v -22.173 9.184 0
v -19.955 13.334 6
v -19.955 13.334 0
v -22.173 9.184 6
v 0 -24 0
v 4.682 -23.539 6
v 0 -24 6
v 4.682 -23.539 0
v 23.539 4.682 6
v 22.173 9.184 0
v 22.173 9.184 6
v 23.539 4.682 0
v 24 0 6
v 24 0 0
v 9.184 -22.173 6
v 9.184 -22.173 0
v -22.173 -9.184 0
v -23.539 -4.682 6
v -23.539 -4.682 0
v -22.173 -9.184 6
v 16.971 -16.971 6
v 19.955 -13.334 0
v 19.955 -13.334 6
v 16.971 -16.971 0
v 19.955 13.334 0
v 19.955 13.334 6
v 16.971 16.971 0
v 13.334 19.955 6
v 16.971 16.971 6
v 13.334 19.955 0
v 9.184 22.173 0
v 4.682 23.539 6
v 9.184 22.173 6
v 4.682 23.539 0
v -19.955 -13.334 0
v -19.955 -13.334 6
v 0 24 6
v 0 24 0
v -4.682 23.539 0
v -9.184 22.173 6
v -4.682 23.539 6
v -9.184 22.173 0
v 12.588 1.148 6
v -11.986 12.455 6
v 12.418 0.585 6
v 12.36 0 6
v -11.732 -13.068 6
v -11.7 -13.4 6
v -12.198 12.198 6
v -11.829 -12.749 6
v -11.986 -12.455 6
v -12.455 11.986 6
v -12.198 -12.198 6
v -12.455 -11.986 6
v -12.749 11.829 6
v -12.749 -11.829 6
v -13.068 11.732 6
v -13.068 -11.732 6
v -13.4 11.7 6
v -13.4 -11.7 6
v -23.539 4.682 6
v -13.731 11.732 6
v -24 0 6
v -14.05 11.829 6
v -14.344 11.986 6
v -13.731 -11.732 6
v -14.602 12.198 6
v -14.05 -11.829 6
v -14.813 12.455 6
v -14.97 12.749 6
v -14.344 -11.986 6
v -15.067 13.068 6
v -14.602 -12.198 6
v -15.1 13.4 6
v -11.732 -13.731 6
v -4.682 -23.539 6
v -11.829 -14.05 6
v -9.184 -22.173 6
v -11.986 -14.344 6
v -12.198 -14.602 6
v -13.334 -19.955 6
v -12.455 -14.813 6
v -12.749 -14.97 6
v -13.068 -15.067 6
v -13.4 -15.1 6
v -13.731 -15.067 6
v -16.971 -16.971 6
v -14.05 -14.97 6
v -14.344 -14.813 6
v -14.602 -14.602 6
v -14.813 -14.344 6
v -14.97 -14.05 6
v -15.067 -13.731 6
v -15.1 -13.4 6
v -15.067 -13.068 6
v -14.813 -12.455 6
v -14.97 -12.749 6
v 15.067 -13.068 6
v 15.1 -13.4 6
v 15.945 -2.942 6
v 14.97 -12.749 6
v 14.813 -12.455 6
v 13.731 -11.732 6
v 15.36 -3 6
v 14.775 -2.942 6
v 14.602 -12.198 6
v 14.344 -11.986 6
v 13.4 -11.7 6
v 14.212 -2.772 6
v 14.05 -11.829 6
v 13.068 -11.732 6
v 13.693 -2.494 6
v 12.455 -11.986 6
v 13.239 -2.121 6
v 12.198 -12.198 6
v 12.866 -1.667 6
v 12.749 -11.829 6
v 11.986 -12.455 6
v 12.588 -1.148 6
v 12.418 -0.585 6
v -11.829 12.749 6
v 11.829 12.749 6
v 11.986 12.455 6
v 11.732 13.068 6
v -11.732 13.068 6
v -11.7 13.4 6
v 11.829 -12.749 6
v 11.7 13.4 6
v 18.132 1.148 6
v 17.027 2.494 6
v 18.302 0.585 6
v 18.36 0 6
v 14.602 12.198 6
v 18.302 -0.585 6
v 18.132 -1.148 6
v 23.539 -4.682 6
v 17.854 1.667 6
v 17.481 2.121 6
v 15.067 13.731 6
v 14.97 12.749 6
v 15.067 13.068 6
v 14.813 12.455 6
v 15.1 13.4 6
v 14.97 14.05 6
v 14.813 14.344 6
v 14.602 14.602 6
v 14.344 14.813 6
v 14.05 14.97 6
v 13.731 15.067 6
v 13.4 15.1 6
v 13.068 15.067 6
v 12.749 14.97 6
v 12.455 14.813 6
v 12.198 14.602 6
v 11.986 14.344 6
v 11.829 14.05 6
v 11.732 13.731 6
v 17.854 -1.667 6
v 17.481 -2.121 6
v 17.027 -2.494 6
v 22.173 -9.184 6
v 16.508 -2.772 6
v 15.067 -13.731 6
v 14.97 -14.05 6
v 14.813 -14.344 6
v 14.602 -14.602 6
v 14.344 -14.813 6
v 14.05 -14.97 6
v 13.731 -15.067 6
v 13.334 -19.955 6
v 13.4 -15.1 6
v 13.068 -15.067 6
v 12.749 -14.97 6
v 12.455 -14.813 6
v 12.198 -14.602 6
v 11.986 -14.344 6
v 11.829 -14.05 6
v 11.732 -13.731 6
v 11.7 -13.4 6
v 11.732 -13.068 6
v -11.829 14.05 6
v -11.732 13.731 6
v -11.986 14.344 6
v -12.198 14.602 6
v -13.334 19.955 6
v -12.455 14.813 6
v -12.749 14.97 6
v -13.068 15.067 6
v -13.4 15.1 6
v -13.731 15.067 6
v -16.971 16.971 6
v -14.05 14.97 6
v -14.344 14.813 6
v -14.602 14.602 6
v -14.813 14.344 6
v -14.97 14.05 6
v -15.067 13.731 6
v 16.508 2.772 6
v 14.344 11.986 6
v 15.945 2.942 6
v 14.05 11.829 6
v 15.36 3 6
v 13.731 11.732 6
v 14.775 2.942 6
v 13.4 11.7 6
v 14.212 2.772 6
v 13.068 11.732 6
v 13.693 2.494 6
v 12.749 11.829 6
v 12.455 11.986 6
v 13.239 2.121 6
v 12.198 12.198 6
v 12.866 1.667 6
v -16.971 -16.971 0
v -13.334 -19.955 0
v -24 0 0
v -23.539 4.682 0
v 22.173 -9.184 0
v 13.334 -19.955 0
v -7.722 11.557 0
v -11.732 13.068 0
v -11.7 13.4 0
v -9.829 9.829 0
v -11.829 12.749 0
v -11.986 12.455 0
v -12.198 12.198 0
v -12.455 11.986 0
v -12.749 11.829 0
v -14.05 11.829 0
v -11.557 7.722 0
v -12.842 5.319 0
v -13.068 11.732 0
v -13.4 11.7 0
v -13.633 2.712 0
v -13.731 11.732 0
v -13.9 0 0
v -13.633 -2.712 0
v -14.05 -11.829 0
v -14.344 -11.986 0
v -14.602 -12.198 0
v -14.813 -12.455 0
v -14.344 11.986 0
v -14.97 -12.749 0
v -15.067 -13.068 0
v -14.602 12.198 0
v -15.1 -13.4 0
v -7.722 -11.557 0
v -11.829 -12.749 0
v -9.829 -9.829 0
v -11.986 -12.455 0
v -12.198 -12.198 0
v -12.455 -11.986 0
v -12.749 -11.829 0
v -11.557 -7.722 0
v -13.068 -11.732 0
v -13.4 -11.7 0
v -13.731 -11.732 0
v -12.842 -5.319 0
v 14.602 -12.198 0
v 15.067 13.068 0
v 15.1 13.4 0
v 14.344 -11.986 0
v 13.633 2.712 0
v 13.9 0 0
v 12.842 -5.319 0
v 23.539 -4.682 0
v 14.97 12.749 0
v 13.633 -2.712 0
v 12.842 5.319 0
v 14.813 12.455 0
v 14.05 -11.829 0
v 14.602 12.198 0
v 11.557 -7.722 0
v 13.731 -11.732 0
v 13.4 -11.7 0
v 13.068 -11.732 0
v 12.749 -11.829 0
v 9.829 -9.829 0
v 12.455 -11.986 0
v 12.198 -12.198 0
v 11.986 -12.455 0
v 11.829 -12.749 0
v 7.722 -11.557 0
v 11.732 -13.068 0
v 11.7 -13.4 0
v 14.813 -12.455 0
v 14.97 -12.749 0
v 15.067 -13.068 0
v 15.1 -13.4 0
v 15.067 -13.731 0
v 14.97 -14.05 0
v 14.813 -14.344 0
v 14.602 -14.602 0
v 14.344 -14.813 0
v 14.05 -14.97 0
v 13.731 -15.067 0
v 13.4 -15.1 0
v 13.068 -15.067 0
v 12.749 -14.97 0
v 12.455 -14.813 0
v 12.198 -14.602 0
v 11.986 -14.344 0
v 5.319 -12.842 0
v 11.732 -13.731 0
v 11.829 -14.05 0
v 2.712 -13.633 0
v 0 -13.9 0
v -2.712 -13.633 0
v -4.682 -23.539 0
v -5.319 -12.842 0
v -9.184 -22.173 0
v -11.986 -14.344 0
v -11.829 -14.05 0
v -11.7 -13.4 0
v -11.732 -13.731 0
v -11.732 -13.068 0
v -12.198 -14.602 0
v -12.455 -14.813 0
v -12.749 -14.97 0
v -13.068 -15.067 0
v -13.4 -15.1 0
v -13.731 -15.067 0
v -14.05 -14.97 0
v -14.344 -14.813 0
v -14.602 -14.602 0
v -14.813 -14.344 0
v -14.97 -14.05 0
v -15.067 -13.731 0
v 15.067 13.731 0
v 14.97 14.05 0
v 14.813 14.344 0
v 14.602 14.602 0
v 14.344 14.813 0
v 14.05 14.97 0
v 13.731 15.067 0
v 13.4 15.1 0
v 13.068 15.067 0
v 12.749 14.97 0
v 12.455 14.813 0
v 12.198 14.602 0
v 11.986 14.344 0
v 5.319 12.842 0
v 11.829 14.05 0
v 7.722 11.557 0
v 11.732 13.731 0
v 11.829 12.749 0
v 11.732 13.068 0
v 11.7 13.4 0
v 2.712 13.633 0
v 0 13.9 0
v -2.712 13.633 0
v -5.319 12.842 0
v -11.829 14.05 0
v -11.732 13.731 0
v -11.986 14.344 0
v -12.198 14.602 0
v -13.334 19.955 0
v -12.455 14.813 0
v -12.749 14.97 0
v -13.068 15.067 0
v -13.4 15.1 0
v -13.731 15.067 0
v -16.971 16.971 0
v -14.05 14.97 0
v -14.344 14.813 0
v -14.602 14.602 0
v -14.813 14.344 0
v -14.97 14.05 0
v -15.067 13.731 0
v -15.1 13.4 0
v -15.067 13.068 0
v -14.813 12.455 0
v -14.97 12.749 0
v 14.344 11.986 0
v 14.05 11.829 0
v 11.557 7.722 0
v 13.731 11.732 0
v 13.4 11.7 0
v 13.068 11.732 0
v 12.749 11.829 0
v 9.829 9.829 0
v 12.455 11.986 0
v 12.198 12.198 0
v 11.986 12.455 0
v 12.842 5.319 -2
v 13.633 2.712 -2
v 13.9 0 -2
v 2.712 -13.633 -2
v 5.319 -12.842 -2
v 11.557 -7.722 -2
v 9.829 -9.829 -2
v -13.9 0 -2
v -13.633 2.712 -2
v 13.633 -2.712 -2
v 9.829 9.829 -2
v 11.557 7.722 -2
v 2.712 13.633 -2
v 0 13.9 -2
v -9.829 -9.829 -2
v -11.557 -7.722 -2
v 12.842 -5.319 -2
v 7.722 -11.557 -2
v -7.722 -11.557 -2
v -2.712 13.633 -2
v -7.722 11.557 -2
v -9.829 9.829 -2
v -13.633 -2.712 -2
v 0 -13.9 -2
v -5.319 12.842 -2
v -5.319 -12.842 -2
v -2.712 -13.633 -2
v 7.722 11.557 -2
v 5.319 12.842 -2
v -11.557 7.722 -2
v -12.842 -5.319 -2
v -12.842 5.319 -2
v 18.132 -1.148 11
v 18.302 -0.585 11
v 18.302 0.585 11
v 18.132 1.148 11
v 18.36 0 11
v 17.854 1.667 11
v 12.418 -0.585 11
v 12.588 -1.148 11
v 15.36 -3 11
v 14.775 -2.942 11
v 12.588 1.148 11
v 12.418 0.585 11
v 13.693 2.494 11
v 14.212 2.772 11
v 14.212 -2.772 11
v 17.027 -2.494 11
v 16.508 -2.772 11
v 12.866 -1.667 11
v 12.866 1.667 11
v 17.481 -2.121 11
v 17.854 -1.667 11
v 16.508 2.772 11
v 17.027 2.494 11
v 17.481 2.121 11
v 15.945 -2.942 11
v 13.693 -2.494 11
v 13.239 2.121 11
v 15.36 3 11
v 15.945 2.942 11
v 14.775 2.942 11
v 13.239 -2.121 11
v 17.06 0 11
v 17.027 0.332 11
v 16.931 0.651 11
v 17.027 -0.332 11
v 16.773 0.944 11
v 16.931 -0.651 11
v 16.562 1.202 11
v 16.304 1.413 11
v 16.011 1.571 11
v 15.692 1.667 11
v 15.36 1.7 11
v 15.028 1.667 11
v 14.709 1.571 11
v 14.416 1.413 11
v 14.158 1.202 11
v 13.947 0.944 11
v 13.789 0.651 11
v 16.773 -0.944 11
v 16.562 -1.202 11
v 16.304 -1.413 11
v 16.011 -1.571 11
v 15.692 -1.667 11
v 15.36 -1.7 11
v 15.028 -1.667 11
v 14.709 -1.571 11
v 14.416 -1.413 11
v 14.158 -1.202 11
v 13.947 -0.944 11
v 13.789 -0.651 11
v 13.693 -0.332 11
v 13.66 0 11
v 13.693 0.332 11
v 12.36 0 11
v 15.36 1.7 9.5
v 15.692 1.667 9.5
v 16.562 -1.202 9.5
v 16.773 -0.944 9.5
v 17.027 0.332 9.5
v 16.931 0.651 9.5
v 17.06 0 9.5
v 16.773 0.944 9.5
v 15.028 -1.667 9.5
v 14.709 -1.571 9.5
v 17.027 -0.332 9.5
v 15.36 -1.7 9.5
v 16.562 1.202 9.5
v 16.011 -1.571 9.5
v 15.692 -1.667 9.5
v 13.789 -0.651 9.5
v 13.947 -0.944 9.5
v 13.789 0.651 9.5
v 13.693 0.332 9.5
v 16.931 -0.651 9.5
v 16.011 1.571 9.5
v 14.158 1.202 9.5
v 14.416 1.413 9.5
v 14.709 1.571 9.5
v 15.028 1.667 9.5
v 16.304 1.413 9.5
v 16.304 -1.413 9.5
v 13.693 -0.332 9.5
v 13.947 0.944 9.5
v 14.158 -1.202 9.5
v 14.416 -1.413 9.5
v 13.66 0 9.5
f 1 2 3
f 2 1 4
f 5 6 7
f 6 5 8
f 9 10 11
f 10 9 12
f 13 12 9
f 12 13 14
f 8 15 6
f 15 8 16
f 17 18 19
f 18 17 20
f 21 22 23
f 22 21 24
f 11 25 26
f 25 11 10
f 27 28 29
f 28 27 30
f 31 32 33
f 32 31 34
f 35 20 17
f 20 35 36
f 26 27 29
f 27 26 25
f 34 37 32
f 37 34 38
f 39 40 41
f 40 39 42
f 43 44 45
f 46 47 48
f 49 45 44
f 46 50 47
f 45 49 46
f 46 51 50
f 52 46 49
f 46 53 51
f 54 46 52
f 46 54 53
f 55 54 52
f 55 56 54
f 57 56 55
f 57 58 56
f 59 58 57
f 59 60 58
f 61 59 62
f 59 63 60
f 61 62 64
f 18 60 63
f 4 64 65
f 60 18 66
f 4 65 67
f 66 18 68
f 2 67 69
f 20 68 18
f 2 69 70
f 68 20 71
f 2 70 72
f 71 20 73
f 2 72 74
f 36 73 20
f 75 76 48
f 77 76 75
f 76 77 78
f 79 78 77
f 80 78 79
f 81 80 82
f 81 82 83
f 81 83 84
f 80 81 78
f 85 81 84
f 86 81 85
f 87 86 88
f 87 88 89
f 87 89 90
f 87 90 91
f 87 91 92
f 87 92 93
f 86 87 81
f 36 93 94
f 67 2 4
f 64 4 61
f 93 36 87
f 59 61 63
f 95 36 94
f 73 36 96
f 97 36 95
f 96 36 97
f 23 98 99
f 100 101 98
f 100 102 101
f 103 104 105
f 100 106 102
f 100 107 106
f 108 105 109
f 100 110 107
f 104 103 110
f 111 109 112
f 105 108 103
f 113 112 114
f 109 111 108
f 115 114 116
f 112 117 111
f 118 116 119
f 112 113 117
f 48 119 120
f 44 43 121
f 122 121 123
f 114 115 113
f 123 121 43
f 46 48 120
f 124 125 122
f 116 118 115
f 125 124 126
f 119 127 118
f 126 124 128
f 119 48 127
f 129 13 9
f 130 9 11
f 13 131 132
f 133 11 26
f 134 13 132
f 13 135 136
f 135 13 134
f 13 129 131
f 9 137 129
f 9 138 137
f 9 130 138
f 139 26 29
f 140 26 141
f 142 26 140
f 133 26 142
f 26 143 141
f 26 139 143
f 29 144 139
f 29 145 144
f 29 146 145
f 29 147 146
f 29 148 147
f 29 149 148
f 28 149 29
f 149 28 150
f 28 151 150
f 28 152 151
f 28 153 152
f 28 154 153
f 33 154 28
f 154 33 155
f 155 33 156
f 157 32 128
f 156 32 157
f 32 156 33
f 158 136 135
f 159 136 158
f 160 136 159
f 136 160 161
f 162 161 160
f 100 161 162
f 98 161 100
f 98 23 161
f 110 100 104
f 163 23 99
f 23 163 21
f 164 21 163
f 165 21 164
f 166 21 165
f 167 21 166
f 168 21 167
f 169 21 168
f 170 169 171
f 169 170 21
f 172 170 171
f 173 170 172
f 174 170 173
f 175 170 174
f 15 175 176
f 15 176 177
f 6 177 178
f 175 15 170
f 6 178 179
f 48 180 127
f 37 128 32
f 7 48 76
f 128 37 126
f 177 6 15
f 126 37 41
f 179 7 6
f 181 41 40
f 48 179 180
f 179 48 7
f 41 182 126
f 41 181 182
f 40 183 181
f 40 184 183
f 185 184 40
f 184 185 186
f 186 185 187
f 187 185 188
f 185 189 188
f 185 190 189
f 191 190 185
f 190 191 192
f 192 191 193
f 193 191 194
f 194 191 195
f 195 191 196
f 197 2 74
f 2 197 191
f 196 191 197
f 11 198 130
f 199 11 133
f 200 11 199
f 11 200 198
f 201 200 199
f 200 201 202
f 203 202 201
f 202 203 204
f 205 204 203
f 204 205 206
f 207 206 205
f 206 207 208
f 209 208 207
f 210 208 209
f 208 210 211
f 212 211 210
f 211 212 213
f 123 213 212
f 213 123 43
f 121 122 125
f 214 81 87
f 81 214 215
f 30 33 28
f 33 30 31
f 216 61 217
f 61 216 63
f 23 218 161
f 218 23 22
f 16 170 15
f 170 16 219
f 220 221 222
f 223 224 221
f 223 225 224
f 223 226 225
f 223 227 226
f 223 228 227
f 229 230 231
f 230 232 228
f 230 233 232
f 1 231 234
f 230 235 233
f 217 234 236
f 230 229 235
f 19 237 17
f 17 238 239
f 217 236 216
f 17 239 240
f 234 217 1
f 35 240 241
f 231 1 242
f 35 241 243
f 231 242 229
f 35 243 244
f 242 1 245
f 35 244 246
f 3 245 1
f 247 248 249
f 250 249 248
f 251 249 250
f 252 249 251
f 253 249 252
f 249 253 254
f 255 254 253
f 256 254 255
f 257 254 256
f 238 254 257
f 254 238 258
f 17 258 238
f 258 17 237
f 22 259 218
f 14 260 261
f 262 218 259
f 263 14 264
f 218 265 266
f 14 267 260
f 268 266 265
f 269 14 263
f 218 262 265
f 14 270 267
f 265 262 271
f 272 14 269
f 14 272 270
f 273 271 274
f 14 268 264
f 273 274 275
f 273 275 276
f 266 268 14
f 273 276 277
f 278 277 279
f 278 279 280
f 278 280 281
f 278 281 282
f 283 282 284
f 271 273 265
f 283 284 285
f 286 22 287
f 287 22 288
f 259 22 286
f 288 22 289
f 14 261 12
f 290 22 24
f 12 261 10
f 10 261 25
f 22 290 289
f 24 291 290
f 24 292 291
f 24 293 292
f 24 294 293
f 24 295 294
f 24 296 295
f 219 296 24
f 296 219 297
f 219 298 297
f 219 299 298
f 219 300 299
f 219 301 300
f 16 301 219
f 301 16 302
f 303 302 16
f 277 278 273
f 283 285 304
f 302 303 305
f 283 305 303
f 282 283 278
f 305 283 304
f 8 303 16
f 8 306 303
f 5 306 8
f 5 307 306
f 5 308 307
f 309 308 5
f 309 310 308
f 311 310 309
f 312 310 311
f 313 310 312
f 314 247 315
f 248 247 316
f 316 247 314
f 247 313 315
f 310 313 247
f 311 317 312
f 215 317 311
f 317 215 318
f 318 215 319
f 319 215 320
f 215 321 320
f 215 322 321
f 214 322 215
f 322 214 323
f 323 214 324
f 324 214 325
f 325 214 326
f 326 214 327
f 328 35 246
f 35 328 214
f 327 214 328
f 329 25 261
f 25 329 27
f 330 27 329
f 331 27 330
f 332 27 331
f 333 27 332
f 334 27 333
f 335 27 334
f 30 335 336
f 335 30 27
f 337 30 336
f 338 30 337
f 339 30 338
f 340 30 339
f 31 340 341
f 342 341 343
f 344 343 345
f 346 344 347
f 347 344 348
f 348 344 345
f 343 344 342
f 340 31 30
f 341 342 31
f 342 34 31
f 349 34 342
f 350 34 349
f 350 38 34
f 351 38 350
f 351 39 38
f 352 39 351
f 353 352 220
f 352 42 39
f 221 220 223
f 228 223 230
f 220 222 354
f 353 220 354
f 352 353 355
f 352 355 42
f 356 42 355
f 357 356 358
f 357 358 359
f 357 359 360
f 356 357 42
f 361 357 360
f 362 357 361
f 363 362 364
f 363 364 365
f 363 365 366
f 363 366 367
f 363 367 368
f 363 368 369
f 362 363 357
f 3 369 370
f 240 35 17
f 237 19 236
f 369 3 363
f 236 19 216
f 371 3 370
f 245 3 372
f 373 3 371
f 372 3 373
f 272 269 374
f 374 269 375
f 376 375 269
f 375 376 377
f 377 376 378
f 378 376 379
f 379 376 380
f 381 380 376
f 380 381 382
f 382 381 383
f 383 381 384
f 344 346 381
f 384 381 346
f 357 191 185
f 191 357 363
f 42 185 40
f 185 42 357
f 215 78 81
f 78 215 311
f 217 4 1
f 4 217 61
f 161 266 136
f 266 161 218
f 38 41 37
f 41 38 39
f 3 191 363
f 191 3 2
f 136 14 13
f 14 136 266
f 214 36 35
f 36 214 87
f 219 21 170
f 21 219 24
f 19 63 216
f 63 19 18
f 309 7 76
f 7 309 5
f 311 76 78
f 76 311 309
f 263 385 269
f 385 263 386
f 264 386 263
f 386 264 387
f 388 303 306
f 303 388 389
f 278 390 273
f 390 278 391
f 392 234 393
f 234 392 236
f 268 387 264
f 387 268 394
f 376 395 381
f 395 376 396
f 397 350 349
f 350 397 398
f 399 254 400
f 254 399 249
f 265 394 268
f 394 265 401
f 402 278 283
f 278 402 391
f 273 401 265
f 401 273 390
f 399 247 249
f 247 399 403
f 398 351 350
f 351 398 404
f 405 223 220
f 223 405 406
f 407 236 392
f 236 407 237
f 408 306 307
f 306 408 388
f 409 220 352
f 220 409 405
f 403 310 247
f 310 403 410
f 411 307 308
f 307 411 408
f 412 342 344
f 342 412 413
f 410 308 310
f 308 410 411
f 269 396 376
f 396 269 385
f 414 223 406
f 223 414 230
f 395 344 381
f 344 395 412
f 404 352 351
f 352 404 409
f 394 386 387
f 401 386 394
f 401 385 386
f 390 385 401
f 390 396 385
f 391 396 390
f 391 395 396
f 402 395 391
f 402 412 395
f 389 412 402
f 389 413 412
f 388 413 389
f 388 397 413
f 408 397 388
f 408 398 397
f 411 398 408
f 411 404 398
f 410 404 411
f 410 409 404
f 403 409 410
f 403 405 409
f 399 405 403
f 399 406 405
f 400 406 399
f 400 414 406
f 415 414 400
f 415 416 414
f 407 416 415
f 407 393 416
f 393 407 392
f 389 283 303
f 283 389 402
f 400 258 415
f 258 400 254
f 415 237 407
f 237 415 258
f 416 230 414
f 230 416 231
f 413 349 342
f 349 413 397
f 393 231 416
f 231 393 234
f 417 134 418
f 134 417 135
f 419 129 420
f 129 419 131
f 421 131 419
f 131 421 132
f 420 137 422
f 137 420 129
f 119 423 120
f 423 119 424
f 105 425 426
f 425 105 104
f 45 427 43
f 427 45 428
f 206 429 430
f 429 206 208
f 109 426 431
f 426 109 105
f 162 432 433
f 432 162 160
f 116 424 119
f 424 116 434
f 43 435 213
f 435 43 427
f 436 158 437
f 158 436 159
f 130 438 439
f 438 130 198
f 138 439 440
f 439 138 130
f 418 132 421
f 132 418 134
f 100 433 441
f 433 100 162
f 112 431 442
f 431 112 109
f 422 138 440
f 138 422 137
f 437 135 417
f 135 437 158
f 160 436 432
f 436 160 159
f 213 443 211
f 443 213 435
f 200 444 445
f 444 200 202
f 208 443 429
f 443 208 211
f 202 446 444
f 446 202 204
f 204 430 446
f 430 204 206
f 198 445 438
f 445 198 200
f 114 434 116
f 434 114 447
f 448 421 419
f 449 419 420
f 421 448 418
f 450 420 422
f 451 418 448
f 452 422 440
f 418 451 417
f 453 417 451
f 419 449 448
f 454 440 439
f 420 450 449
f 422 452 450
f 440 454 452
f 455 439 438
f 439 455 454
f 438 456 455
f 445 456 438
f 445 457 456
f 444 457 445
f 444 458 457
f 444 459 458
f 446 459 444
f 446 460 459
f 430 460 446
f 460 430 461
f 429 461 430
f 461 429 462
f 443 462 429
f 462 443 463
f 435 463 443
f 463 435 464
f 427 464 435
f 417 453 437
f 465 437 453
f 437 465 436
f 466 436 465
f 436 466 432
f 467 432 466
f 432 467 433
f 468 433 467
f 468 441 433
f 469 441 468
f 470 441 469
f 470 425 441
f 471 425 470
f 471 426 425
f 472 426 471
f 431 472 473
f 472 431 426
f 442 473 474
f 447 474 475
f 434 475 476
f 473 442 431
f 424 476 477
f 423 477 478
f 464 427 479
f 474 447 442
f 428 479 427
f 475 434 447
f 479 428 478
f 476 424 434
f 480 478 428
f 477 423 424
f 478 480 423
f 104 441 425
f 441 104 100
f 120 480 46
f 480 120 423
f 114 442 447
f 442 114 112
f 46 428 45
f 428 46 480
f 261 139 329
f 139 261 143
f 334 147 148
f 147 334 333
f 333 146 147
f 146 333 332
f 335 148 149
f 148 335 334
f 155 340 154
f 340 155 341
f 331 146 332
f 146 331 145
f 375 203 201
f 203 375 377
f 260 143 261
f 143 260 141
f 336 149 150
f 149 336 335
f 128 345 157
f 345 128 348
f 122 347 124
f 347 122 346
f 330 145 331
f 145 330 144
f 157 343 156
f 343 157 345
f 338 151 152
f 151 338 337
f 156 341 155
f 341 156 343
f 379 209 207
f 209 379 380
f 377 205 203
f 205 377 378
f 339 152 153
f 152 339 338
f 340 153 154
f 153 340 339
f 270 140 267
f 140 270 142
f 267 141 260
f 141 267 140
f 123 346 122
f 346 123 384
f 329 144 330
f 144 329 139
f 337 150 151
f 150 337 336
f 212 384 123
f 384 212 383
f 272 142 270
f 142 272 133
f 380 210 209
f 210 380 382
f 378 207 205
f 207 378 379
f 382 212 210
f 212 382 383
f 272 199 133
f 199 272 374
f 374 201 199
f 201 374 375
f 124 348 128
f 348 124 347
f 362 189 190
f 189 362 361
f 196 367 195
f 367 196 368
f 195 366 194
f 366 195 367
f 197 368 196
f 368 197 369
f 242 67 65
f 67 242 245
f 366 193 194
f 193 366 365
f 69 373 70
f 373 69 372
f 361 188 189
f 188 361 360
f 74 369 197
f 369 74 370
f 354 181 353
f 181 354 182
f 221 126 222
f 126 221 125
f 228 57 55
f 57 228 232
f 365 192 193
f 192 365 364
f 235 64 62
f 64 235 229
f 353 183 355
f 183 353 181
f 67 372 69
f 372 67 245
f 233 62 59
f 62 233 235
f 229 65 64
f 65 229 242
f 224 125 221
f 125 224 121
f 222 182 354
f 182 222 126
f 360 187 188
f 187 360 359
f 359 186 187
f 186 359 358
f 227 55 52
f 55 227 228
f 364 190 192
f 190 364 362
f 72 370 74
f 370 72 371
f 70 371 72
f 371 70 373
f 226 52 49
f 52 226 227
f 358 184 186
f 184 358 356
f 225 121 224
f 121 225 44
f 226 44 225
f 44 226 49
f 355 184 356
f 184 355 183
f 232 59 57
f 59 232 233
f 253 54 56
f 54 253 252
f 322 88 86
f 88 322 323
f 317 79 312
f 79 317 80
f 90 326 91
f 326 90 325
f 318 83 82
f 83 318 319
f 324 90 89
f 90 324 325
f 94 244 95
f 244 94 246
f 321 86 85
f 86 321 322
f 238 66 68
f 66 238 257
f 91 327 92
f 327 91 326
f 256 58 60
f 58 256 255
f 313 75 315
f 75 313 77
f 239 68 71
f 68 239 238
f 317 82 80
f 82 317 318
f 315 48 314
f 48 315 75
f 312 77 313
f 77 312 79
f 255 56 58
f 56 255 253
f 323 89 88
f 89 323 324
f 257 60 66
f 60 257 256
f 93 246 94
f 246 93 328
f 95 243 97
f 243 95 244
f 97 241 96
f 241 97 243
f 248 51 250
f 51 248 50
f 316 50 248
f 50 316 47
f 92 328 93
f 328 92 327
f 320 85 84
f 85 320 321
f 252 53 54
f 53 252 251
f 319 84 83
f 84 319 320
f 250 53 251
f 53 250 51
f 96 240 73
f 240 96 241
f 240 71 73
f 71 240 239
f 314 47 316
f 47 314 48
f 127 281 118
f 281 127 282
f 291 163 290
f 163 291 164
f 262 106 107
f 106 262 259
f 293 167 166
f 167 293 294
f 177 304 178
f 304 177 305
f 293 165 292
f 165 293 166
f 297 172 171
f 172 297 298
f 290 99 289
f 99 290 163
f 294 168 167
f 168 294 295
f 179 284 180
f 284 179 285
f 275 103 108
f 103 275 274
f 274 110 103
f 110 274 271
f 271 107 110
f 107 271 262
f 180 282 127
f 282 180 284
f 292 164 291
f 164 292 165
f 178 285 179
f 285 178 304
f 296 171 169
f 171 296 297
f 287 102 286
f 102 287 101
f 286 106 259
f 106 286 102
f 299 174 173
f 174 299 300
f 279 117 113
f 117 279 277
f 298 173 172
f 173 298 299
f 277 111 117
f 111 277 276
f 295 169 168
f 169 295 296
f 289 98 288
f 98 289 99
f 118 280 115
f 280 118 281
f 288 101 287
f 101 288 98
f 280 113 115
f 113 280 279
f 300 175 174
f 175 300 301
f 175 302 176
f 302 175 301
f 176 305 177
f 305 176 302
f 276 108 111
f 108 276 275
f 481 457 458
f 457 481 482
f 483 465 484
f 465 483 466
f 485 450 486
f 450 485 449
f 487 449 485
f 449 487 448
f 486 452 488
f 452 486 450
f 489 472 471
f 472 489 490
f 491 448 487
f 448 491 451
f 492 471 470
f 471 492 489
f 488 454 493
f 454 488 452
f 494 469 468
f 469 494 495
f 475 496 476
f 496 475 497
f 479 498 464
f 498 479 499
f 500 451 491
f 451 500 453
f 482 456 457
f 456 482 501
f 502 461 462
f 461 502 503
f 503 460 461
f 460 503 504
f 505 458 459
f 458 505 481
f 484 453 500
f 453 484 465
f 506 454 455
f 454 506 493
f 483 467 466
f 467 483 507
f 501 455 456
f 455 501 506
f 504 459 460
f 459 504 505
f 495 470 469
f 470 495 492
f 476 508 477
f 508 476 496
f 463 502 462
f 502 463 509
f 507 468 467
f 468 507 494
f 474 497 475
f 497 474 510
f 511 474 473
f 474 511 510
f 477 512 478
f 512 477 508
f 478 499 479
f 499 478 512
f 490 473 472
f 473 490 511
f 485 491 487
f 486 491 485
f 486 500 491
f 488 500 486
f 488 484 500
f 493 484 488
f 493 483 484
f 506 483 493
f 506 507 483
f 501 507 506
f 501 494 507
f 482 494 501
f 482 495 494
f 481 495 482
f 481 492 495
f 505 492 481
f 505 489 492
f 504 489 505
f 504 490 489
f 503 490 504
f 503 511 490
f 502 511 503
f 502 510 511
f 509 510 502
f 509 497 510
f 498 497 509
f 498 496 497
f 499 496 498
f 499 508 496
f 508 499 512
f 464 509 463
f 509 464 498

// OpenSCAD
$fn = 32;

// ----------------------------------------------------------------------
// Retaining cap: 6001 cover, 48 mm, spigot 27.8 mm
// ----------------------------------------------------------------------

// --- parameters (mm) ---
plate_d = 48;             // cover diameter
plate_t = 6;              // cover thickness
boss_d = 27.8;            // spigot that enters the housing
boss_h = 2;               // spigot height
bolt_d = 3.4;             // bolt clearance
bolt_r = 18.95;           // bolt circle radius
nipple_d = 6;             // grease nipple boss
nipple_h = 5;             // grease nipple boss height

module cover() {
  cylinder(h = plate_t, d = plate_d);
}

module spigot() {
  /* sunk 1 mm into the cover; the spigot sets the overall height */
  translate([0, 0, -boss_h]) cylinder(h = boss_h + 1, d = boss_d);
}

module nipple() {
  translate([plate_d * 0.32, 0, plate_t - 1])
    cylinder(h = nipple_h + 1, d = nipple_d);
}

difference() {
  union() {
    cover();
    spigot();
    nipple();
  }
  for (i = [0 : 3]) rotate([0, 0, 45 + i * 90]) translate([bolt_r, 0, -boss_h - 1])
    cylinder(h = boss_h + plate_t + 2, d = bolt_d);
  translate([plate_d * 0.32, 0, plate_t + nipple_h - 1.5]) cylinder(h = 4, d = 3.4);
}
